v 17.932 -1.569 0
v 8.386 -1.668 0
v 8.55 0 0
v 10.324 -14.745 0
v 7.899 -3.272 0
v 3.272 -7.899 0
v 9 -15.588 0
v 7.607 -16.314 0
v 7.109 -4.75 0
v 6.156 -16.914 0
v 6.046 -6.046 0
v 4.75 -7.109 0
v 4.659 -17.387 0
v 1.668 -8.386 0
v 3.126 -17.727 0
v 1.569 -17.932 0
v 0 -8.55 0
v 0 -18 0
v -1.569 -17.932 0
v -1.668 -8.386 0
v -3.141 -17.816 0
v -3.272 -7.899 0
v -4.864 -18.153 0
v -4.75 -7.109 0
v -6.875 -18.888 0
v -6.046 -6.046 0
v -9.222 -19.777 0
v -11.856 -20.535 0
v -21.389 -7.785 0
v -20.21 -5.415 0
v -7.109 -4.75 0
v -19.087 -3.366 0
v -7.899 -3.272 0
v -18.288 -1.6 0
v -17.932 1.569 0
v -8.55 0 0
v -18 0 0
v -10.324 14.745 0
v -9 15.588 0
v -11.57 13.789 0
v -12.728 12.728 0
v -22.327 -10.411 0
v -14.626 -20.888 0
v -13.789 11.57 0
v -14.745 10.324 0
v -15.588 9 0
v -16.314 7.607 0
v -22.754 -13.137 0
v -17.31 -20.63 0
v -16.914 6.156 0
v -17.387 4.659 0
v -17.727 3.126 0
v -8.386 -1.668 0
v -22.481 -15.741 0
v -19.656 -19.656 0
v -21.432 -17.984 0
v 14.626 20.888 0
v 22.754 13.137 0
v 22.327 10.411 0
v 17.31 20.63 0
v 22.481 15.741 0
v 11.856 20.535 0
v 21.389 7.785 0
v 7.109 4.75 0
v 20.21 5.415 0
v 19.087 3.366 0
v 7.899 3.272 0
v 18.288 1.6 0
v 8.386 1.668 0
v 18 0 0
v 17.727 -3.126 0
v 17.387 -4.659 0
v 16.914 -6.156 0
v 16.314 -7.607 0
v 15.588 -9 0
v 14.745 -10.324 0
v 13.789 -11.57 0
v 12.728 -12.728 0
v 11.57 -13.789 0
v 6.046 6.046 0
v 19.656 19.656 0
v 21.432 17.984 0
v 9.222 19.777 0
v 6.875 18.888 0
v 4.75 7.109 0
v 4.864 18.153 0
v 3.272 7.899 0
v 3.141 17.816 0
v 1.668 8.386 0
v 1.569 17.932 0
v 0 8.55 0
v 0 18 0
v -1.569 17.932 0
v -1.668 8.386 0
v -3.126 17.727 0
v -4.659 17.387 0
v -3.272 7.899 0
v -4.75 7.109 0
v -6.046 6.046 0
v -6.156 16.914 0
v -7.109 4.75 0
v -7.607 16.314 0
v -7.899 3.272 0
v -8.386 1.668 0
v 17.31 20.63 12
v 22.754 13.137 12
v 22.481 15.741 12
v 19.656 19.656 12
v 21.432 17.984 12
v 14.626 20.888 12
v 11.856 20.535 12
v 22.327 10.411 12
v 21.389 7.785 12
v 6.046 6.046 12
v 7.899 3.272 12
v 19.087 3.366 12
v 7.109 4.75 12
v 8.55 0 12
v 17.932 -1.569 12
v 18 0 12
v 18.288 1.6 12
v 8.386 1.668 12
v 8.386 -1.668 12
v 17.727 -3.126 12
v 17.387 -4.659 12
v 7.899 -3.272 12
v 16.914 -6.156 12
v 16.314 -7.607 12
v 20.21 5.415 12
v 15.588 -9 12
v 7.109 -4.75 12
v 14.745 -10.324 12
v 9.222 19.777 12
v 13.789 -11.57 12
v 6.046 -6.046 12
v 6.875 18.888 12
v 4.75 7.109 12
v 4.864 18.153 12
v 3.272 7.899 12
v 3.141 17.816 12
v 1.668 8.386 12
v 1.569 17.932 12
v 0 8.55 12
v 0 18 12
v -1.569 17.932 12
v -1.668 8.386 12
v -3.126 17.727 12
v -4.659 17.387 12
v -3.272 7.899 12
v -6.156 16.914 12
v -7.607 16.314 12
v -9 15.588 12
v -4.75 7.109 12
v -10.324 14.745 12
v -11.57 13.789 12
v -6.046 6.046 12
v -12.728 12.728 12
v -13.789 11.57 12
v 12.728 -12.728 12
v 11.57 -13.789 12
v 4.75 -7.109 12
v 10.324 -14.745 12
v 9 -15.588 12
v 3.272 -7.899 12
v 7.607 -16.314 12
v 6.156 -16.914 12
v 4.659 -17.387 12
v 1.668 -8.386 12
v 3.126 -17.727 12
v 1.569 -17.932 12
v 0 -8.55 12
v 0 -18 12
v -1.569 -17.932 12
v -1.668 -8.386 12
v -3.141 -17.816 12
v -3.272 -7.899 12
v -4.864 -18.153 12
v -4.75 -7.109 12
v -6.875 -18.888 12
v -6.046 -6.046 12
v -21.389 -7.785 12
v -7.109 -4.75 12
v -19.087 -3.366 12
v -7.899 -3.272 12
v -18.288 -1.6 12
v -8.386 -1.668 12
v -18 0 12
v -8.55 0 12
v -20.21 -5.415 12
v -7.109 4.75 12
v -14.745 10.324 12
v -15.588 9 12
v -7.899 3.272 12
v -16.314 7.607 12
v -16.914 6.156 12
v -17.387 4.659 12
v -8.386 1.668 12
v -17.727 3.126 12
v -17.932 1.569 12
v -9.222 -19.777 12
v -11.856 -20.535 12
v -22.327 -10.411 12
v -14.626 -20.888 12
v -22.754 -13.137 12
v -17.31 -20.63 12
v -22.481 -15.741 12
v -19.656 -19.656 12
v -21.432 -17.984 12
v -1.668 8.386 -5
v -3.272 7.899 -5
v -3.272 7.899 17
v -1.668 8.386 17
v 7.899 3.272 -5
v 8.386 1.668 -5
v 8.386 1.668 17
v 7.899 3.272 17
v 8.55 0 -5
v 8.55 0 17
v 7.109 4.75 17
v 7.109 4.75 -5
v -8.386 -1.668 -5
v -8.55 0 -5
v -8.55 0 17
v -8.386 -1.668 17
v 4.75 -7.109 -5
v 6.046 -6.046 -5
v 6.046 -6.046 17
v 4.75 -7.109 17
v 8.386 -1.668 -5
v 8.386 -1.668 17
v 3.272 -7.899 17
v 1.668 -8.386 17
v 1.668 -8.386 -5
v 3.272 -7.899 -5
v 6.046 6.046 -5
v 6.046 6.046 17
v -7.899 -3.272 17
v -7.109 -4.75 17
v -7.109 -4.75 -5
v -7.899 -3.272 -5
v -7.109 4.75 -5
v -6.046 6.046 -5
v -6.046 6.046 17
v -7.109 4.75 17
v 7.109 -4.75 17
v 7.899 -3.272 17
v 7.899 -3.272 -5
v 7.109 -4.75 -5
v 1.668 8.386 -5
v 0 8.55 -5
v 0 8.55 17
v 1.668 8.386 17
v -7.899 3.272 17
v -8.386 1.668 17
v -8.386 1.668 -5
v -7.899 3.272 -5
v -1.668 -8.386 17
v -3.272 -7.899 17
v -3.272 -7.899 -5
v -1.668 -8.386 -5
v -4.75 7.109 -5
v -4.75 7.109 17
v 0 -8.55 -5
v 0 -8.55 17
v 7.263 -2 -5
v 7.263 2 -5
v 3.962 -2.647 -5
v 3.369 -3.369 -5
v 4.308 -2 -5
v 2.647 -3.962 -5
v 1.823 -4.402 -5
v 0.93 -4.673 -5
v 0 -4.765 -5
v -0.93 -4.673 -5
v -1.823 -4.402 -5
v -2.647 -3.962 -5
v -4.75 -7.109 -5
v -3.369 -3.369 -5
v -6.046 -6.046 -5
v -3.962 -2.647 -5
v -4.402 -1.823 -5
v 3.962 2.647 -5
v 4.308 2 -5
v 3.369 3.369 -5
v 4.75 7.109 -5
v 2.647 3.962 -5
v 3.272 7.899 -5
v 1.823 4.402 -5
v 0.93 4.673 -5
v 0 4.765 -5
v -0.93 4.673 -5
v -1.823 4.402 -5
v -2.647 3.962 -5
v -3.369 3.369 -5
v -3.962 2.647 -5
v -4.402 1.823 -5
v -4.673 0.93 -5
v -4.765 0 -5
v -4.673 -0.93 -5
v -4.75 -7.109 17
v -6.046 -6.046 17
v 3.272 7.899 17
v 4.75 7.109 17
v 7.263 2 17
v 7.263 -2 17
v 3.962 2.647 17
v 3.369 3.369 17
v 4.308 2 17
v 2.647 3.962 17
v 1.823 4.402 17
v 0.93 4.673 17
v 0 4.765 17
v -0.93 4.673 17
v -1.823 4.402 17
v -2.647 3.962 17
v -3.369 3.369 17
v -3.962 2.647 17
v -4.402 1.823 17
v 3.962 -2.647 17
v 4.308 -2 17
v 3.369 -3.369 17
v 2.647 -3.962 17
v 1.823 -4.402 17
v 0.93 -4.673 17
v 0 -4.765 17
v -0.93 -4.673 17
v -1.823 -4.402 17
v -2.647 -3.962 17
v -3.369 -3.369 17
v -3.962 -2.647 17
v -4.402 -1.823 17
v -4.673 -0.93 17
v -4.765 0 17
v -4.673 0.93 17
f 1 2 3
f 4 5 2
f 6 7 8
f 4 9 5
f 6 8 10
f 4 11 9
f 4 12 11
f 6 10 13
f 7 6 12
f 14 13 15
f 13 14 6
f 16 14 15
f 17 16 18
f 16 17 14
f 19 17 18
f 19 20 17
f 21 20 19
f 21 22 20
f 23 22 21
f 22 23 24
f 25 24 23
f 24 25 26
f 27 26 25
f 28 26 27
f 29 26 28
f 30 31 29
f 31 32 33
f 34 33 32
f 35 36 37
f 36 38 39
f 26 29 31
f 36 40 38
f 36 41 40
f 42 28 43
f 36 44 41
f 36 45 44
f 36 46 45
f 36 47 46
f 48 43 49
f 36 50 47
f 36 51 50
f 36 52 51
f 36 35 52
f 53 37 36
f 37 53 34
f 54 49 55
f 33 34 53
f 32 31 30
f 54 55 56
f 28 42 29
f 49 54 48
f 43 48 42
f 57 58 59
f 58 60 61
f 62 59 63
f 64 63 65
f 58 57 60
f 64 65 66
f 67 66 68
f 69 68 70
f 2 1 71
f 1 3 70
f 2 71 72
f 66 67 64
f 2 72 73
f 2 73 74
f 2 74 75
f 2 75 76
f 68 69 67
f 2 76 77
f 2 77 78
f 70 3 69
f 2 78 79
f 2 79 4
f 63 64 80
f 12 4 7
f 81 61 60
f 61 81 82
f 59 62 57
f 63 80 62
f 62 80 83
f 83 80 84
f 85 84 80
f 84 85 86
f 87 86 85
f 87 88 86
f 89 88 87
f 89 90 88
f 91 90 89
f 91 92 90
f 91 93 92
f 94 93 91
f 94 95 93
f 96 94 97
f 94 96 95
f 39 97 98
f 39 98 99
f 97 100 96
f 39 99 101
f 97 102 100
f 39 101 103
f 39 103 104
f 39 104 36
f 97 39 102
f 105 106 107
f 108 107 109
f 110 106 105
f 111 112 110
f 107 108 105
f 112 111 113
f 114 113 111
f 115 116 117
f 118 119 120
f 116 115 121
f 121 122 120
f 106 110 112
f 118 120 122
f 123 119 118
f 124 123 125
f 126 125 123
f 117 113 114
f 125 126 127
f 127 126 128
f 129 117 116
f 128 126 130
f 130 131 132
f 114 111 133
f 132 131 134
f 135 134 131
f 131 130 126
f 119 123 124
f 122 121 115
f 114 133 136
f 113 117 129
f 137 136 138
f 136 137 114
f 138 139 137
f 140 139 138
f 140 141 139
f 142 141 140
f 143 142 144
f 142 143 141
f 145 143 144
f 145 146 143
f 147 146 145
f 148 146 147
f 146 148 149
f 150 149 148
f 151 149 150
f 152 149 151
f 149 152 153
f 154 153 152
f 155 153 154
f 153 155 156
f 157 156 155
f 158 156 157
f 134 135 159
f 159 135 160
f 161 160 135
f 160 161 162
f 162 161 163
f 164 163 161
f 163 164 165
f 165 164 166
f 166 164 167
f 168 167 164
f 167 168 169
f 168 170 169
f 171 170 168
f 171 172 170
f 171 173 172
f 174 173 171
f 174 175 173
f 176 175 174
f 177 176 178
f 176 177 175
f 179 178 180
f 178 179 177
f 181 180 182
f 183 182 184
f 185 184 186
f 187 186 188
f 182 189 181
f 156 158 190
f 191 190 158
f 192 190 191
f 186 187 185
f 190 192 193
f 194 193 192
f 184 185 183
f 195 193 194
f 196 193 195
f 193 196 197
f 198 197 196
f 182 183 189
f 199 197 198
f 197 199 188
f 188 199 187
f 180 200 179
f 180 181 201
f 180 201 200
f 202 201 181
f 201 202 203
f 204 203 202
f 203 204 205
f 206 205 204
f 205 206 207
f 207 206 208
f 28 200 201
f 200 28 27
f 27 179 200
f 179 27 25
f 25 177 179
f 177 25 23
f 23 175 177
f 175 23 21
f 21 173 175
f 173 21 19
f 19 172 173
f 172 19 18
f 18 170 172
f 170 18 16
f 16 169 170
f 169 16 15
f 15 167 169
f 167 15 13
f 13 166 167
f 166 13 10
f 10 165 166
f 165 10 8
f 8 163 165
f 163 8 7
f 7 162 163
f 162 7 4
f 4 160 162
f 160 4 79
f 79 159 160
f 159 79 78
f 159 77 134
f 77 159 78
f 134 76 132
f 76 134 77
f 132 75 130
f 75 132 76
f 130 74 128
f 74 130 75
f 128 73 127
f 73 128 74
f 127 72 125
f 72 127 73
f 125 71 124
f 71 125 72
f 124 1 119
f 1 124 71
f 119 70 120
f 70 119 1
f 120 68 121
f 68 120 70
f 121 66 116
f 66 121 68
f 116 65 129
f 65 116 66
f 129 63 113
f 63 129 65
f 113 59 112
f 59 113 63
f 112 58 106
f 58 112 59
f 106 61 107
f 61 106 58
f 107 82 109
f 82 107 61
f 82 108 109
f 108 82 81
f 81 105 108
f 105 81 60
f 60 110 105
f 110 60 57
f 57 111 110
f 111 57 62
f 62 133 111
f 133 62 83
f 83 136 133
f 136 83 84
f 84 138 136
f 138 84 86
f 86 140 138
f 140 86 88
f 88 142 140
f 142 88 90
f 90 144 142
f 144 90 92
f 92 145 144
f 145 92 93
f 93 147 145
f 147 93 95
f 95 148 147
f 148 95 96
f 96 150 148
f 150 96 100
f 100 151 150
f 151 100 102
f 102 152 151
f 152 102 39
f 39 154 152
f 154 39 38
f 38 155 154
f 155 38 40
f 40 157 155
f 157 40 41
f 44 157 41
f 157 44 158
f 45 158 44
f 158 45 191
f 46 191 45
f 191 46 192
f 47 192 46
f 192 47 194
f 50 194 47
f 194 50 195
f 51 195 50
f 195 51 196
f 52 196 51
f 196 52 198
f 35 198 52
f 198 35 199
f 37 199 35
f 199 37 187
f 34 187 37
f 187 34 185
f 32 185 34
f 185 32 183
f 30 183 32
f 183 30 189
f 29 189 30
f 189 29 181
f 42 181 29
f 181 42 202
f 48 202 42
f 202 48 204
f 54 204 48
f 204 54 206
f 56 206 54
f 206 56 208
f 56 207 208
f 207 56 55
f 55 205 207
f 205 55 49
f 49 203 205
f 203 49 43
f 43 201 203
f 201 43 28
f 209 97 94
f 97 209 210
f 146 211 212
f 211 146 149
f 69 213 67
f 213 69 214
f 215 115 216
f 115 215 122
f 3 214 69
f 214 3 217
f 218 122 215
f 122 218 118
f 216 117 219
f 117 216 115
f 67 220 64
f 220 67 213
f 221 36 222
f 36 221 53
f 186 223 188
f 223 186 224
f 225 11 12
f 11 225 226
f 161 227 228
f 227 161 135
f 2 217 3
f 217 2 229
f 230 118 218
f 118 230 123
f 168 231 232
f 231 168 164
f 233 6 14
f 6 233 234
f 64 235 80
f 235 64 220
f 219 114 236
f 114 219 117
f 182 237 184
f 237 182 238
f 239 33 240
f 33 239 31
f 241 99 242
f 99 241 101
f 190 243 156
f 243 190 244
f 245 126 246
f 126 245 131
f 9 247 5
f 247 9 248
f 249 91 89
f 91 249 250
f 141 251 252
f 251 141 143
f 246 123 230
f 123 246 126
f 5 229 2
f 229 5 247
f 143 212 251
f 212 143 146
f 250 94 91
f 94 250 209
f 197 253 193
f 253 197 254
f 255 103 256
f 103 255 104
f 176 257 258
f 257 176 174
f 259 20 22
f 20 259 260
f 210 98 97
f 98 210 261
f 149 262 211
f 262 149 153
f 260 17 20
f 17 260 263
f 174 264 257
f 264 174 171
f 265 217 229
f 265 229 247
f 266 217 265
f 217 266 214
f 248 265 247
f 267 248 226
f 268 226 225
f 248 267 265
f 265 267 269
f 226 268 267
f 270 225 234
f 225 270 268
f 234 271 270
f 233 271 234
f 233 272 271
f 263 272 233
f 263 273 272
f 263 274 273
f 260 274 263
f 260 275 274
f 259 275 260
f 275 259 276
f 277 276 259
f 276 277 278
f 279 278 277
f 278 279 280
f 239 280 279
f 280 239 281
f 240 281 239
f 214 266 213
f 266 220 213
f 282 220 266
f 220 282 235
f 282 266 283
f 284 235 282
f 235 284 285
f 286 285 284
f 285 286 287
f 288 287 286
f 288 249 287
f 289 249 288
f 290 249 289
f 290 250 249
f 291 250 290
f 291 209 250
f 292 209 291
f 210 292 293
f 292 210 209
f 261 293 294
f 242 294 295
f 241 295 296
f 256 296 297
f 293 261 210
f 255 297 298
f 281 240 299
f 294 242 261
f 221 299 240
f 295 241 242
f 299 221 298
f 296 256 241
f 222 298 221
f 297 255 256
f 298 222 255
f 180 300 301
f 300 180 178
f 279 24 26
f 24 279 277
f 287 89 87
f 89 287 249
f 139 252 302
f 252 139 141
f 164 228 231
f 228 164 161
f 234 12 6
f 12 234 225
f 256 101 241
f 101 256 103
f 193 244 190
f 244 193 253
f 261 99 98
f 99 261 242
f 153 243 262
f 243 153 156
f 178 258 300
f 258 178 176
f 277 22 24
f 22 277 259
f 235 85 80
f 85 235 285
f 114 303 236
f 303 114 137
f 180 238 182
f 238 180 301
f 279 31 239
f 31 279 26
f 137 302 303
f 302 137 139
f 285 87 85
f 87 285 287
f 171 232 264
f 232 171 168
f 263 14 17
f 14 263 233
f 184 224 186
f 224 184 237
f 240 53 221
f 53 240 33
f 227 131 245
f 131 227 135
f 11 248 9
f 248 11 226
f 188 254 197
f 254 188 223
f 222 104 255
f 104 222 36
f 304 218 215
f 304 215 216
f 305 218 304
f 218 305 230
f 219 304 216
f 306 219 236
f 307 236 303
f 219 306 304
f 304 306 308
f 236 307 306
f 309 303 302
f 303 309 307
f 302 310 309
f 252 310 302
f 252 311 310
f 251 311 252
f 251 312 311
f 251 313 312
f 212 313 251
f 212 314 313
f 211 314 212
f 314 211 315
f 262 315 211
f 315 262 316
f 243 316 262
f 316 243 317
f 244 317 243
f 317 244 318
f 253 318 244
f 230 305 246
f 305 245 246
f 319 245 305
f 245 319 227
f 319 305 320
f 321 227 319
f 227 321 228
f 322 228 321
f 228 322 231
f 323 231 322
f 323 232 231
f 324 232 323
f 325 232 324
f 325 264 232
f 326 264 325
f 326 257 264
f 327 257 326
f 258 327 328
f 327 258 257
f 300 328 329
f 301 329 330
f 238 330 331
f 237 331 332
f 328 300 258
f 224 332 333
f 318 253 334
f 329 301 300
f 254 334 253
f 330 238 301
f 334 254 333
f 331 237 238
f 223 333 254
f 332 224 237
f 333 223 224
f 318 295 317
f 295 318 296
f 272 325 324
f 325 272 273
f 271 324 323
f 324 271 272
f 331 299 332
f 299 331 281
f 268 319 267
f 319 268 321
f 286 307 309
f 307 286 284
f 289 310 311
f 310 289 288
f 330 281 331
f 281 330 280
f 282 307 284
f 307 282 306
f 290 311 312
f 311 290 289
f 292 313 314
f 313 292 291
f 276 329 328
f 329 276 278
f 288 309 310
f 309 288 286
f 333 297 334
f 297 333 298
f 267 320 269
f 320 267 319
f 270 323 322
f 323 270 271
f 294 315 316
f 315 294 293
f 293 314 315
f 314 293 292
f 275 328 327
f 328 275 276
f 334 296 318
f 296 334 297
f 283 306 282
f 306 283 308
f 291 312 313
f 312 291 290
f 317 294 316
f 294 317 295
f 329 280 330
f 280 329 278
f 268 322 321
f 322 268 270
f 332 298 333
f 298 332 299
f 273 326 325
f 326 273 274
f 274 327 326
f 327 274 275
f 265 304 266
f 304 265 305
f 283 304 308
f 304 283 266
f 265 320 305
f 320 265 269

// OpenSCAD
$fn = 32;

// ----------------------------------------------------------------------
// Cam: base radius 18 mm with a 10 mm lift over 150 degrees
// ----------------------------------------------------------------------

// --- parameters (mm) ---
base_r = 18;              // base radius
lift = 10;                // lift height above the base radius
lift_span = 150;          // angular width of the lift
lift_start = 0;           // angle where the lift starts
cam_t = 12;               // cam plate thickness
hub_d = 17.1;             // hub diameter
hub_h = 22;               // hub height
bore_d = 9.53;            // bore
key_w = 4;                // keyway width
key_depth = 1.79;         // keyway depth

cam_profile = [[18, 0], [18.288, 1.6], [19.087, 3.366], [20.21, 5.415], [21.389, 7.785], [22.327, 10.411], [22.754, 13.137], [22.481, 15.741], [21.432, 17.984], [19.656, 19.656], [17.31, 20.63], [14.626, 20.888], [11.856, 20.535], [9.222, 19.777], [6.875, 18.888], [4.864, 18.153], [3.141, 17.816], [1.569, 17.932], [0, 18], [-1.569, 17.932], [-3.126, 17.727], [-4.659, 17.387], [-6.156, 16.914], [-7.607, 16.314], [-9, 15.588], [-10.324, 14.745], [-11.57, 13.789], [-12.728, 12.728], [-13.789, 11.57], [-14.745, 10.324], [-15.588, 9], [-16.314, 7.607], [-16.914, 6.156], [-17.387, 4.659], [-17.727, 3.126], [-17.932, 1.569], [-18, 0], [-18.288, -1.6], [-19.087, -3.366], [-20.21, -5.415], [-21.389, -7.785], [-22.327, -10.411], [-22.754, -13.137], [-22.481, -15.741], [-21.432, -17.984], [-19.656, -19.656], [-17.31, -20.63], [-14.626, -20.888], [-11.856, -20.535], [-9.222, -19.777], [-6.875, -18.888], [-4.864, -18.153], [-3.141, -17.816], [-1.569, -17.932], [0, -18], [1.569, -17.932], [3.126, -17.727], [4.659, -17.387], [6.156, -16.914], [7.607, -16.314], [9, -15.588], [10.324, -14.745], [11.57, -13.789], [12.728, -12.728], [13.789, -11.57], [14.745, -10.324], [15.588, -9], [16.314, -7.607], [16.914, -6.156], [17.387, -4.659], [17.727, -3.126], [17.932, -1.569]];

difference() {
  union() {
    linear_extrude(height = cam_t) polygon(cam_profile);
    /* hub, proud of the cam plate on both sides */
    translate([0, 0, -5]) cylinder(h = hub_h, d = hub_d);
  }
  /* bore through the hub, 2.5 mm clear on both faces */
  translate([0, 0, -7.5]) cylinder(h = hub_h + 5, d = bore_d);
  /* keyway, milled through the whole hub */
  translate([2.973, -2, -7.5]) cube([4.29, 4, 27]);
}
